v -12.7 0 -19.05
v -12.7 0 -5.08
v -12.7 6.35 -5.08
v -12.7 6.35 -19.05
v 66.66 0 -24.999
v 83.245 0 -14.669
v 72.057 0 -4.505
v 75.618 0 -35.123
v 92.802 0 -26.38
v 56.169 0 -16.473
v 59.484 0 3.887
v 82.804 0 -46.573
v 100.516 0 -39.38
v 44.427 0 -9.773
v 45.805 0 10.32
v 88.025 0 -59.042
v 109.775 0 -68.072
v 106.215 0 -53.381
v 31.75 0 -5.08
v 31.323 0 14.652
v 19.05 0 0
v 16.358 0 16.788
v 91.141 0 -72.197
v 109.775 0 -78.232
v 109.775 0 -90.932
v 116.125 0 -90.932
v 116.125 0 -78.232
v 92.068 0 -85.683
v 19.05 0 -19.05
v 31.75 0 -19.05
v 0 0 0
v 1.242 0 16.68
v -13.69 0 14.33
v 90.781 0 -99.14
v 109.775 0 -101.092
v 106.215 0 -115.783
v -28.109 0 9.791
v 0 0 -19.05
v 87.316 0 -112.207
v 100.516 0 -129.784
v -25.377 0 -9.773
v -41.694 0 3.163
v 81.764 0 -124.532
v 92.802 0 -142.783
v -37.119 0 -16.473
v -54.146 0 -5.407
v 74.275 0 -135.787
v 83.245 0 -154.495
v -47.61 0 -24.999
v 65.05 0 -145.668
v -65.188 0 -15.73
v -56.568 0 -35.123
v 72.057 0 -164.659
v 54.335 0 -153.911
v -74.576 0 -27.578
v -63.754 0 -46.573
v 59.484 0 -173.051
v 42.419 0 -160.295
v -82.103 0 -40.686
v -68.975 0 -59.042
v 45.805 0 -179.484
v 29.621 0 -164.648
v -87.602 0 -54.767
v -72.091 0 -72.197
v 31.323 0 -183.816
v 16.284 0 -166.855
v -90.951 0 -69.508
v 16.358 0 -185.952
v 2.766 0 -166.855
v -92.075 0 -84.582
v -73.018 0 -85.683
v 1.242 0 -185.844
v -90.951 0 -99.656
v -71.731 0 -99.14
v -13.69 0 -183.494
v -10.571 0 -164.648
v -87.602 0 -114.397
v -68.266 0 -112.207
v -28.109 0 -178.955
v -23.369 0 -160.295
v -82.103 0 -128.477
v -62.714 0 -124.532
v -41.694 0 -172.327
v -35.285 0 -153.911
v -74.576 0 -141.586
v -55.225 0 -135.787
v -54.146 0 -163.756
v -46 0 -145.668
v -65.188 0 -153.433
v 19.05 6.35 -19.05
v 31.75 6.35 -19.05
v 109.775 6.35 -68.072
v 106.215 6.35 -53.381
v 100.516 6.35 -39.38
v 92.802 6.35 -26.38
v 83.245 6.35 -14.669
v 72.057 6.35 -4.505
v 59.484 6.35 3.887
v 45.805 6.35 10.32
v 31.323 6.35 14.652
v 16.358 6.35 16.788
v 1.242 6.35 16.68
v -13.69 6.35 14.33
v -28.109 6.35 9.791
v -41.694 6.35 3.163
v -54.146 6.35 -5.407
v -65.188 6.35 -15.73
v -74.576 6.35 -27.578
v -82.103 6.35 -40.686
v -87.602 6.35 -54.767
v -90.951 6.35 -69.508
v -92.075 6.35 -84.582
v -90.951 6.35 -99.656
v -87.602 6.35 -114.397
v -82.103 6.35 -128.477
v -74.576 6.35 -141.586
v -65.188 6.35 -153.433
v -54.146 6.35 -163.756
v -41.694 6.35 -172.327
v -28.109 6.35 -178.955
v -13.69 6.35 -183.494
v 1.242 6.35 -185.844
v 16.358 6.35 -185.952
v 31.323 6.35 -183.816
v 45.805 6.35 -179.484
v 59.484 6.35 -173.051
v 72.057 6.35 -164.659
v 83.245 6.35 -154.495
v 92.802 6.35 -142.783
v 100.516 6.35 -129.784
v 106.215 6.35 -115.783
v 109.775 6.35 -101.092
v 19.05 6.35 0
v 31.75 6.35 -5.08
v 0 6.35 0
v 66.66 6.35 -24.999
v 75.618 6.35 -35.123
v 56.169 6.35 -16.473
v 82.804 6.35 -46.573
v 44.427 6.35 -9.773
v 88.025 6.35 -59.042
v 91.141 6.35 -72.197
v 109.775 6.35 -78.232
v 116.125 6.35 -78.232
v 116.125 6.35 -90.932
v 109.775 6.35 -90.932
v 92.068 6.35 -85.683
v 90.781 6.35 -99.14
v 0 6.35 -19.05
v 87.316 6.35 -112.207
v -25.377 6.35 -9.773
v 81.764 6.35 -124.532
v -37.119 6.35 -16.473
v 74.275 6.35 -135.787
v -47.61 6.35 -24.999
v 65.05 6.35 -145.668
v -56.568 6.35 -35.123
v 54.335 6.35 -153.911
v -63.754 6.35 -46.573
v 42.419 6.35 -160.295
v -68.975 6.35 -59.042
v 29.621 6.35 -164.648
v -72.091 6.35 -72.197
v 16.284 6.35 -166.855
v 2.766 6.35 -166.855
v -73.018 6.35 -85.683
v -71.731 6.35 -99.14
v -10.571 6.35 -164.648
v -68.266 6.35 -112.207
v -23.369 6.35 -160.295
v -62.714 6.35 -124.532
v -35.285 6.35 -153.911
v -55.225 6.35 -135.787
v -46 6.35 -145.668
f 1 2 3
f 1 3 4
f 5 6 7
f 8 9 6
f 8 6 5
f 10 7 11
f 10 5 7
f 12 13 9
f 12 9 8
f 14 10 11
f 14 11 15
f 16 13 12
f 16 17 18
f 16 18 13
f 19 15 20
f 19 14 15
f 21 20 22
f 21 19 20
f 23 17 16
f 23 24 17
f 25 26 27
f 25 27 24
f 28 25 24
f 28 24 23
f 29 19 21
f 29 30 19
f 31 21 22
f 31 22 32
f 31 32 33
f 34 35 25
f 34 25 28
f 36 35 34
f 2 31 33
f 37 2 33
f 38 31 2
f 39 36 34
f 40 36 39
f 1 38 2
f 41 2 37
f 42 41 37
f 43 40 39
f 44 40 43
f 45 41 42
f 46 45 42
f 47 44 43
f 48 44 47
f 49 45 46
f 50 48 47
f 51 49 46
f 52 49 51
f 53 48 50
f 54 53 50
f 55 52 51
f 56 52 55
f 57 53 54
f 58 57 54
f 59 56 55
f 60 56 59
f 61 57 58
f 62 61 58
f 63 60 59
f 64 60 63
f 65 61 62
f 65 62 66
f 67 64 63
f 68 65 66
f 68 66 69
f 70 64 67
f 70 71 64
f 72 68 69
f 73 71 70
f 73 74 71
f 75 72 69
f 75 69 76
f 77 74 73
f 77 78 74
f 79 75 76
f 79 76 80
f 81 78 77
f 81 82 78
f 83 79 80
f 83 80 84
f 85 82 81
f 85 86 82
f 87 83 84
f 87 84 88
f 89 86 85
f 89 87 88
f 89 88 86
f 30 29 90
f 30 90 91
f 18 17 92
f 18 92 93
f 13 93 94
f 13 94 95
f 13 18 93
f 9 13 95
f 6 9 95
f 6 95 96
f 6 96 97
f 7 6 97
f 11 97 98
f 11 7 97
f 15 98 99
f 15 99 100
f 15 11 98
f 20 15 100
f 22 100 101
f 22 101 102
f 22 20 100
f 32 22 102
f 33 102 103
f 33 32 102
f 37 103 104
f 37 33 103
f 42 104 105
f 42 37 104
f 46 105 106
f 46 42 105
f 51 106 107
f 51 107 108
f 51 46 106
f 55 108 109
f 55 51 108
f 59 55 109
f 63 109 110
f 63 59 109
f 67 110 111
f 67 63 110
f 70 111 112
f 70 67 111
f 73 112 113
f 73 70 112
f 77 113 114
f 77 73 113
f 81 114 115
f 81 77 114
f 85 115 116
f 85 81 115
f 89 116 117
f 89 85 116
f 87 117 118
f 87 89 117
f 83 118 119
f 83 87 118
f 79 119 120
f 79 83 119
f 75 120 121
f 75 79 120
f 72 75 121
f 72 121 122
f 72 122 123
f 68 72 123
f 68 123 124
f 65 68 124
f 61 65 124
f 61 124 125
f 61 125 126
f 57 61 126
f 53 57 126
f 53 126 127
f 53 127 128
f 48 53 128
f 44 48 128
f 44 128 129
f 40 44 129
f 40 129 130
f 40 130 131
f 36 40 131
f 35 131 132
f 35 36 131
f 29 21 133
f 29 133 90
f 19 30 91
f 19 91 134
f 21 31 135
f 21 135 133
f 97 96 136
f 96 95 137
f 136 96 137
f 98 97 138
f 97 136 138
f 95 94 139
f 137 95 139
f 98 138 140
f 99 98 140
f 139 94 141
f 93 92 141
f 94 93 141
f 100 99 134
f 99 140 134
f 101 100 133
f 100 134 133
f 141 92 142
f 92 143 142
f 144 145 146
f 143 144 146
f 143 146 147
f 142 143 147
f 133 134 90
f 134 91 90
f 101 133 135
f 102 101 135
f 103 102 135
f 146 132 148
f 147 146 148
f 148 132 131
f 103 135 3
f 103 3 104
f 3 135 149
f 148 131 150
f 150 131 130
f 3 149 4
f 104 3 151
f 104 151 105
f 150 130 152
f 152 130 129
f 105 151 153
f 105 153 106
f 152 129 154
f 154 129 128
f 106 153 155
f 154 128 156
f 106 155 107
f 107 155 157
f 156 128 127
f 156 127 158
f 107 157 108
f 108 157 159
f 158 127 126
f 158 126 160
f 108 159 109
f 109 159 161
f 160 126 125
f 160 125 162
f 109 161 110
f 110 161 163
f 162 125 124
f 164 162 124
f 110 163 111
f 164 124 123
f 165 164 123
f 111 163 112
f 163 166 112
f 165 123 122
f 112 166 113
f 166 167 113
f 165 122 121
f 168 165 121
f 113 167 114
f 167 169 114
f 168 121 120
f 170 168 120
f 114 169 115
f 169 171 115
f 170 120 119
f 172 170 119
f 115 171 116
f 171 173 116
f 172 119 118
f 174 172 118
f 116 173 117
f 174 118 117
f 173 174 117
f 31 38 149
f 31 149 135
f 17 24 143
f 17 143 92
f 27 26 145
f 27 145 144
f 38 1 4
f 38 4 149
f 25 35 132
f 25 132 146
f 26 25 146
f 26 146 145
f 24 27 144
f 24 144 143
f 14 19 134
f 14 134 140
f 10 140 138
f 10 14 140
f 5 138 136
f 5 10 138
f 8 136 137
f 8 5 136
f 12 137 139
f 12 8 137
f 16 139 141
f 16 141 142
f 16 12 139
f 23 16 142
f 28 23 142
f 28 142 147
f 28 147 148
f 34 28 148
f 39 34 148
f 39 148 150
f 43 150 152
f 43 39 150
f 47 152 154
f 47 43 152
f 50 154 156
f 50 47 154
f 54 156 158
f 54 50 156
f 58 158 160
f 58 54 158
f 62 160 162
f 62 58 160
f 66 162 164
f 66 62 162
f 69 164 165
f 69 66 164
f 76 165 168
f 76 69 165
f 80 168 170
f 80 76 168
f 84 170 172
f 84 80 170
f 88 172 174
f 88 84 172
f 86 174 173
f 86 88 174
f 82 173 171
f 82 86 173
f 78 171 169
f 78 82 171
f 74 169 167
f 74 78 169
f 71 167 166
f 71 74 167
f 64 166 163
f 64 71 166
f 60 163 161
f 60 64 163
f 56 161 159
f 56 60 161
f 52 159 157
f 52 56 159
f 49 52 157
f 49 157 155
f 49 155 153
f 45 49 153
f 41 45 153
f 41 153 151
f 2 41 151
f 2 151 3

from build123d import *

# Parameters (mm, degrees)
BOSS_EXTRUDE1_DEPTH = 6.35


with BuildPart() as part:
    # Sketch1 → Boss-Extrude1 (new body)
    with BuildSketch(Plane(origin=(0, 0, 0), x_dir=(1, 0, 0), z_dir=(0, 1, 0))):
        with BuildLine():
            Line((109.774588029, 101.091898562), (109.774588029, 90.931898562))
            Line((109.774588029, 90.931898562), (116.124588029, 90.931898562))
            Line((116.124588029, 90.931898562), (116.124588029, 78.231898562))
            Line((116.124588029, 78.231898562), (109.774588029, 78.231898562))
            Line((109.774588029, 78.231898562), (109.774588029, 68.071898562))
            ThreePointArc((109.774588029, 68.071898562), (-92.075, 84.581898562), (109.774588029, 101.091898562))
        make_face()
        with BuildLine():
            Line((0, 0), (19.05, 0))
            Line((19.05, 0), (19.05, 19.05))
            Line((19.05, 19.05), (31.75, 19.05))
            Line((31.75, 19.05), (31.75, 5.08))
            ThreePointArc((31.75, 5.08), (9.525, 167.131898562), (-12.7, 5.08))
            Line((-12.7, 5.08), (-12.7, 19.05))
            Line((-12.7, 19.05), (0, 19.05))
            Line((0, 19.05), (0, 0))
        make_face(mode=Mode.SUBTRACT)
    extrude(amount=BOSS_EXTRUDE1_DEPTH)


solid = part.part
